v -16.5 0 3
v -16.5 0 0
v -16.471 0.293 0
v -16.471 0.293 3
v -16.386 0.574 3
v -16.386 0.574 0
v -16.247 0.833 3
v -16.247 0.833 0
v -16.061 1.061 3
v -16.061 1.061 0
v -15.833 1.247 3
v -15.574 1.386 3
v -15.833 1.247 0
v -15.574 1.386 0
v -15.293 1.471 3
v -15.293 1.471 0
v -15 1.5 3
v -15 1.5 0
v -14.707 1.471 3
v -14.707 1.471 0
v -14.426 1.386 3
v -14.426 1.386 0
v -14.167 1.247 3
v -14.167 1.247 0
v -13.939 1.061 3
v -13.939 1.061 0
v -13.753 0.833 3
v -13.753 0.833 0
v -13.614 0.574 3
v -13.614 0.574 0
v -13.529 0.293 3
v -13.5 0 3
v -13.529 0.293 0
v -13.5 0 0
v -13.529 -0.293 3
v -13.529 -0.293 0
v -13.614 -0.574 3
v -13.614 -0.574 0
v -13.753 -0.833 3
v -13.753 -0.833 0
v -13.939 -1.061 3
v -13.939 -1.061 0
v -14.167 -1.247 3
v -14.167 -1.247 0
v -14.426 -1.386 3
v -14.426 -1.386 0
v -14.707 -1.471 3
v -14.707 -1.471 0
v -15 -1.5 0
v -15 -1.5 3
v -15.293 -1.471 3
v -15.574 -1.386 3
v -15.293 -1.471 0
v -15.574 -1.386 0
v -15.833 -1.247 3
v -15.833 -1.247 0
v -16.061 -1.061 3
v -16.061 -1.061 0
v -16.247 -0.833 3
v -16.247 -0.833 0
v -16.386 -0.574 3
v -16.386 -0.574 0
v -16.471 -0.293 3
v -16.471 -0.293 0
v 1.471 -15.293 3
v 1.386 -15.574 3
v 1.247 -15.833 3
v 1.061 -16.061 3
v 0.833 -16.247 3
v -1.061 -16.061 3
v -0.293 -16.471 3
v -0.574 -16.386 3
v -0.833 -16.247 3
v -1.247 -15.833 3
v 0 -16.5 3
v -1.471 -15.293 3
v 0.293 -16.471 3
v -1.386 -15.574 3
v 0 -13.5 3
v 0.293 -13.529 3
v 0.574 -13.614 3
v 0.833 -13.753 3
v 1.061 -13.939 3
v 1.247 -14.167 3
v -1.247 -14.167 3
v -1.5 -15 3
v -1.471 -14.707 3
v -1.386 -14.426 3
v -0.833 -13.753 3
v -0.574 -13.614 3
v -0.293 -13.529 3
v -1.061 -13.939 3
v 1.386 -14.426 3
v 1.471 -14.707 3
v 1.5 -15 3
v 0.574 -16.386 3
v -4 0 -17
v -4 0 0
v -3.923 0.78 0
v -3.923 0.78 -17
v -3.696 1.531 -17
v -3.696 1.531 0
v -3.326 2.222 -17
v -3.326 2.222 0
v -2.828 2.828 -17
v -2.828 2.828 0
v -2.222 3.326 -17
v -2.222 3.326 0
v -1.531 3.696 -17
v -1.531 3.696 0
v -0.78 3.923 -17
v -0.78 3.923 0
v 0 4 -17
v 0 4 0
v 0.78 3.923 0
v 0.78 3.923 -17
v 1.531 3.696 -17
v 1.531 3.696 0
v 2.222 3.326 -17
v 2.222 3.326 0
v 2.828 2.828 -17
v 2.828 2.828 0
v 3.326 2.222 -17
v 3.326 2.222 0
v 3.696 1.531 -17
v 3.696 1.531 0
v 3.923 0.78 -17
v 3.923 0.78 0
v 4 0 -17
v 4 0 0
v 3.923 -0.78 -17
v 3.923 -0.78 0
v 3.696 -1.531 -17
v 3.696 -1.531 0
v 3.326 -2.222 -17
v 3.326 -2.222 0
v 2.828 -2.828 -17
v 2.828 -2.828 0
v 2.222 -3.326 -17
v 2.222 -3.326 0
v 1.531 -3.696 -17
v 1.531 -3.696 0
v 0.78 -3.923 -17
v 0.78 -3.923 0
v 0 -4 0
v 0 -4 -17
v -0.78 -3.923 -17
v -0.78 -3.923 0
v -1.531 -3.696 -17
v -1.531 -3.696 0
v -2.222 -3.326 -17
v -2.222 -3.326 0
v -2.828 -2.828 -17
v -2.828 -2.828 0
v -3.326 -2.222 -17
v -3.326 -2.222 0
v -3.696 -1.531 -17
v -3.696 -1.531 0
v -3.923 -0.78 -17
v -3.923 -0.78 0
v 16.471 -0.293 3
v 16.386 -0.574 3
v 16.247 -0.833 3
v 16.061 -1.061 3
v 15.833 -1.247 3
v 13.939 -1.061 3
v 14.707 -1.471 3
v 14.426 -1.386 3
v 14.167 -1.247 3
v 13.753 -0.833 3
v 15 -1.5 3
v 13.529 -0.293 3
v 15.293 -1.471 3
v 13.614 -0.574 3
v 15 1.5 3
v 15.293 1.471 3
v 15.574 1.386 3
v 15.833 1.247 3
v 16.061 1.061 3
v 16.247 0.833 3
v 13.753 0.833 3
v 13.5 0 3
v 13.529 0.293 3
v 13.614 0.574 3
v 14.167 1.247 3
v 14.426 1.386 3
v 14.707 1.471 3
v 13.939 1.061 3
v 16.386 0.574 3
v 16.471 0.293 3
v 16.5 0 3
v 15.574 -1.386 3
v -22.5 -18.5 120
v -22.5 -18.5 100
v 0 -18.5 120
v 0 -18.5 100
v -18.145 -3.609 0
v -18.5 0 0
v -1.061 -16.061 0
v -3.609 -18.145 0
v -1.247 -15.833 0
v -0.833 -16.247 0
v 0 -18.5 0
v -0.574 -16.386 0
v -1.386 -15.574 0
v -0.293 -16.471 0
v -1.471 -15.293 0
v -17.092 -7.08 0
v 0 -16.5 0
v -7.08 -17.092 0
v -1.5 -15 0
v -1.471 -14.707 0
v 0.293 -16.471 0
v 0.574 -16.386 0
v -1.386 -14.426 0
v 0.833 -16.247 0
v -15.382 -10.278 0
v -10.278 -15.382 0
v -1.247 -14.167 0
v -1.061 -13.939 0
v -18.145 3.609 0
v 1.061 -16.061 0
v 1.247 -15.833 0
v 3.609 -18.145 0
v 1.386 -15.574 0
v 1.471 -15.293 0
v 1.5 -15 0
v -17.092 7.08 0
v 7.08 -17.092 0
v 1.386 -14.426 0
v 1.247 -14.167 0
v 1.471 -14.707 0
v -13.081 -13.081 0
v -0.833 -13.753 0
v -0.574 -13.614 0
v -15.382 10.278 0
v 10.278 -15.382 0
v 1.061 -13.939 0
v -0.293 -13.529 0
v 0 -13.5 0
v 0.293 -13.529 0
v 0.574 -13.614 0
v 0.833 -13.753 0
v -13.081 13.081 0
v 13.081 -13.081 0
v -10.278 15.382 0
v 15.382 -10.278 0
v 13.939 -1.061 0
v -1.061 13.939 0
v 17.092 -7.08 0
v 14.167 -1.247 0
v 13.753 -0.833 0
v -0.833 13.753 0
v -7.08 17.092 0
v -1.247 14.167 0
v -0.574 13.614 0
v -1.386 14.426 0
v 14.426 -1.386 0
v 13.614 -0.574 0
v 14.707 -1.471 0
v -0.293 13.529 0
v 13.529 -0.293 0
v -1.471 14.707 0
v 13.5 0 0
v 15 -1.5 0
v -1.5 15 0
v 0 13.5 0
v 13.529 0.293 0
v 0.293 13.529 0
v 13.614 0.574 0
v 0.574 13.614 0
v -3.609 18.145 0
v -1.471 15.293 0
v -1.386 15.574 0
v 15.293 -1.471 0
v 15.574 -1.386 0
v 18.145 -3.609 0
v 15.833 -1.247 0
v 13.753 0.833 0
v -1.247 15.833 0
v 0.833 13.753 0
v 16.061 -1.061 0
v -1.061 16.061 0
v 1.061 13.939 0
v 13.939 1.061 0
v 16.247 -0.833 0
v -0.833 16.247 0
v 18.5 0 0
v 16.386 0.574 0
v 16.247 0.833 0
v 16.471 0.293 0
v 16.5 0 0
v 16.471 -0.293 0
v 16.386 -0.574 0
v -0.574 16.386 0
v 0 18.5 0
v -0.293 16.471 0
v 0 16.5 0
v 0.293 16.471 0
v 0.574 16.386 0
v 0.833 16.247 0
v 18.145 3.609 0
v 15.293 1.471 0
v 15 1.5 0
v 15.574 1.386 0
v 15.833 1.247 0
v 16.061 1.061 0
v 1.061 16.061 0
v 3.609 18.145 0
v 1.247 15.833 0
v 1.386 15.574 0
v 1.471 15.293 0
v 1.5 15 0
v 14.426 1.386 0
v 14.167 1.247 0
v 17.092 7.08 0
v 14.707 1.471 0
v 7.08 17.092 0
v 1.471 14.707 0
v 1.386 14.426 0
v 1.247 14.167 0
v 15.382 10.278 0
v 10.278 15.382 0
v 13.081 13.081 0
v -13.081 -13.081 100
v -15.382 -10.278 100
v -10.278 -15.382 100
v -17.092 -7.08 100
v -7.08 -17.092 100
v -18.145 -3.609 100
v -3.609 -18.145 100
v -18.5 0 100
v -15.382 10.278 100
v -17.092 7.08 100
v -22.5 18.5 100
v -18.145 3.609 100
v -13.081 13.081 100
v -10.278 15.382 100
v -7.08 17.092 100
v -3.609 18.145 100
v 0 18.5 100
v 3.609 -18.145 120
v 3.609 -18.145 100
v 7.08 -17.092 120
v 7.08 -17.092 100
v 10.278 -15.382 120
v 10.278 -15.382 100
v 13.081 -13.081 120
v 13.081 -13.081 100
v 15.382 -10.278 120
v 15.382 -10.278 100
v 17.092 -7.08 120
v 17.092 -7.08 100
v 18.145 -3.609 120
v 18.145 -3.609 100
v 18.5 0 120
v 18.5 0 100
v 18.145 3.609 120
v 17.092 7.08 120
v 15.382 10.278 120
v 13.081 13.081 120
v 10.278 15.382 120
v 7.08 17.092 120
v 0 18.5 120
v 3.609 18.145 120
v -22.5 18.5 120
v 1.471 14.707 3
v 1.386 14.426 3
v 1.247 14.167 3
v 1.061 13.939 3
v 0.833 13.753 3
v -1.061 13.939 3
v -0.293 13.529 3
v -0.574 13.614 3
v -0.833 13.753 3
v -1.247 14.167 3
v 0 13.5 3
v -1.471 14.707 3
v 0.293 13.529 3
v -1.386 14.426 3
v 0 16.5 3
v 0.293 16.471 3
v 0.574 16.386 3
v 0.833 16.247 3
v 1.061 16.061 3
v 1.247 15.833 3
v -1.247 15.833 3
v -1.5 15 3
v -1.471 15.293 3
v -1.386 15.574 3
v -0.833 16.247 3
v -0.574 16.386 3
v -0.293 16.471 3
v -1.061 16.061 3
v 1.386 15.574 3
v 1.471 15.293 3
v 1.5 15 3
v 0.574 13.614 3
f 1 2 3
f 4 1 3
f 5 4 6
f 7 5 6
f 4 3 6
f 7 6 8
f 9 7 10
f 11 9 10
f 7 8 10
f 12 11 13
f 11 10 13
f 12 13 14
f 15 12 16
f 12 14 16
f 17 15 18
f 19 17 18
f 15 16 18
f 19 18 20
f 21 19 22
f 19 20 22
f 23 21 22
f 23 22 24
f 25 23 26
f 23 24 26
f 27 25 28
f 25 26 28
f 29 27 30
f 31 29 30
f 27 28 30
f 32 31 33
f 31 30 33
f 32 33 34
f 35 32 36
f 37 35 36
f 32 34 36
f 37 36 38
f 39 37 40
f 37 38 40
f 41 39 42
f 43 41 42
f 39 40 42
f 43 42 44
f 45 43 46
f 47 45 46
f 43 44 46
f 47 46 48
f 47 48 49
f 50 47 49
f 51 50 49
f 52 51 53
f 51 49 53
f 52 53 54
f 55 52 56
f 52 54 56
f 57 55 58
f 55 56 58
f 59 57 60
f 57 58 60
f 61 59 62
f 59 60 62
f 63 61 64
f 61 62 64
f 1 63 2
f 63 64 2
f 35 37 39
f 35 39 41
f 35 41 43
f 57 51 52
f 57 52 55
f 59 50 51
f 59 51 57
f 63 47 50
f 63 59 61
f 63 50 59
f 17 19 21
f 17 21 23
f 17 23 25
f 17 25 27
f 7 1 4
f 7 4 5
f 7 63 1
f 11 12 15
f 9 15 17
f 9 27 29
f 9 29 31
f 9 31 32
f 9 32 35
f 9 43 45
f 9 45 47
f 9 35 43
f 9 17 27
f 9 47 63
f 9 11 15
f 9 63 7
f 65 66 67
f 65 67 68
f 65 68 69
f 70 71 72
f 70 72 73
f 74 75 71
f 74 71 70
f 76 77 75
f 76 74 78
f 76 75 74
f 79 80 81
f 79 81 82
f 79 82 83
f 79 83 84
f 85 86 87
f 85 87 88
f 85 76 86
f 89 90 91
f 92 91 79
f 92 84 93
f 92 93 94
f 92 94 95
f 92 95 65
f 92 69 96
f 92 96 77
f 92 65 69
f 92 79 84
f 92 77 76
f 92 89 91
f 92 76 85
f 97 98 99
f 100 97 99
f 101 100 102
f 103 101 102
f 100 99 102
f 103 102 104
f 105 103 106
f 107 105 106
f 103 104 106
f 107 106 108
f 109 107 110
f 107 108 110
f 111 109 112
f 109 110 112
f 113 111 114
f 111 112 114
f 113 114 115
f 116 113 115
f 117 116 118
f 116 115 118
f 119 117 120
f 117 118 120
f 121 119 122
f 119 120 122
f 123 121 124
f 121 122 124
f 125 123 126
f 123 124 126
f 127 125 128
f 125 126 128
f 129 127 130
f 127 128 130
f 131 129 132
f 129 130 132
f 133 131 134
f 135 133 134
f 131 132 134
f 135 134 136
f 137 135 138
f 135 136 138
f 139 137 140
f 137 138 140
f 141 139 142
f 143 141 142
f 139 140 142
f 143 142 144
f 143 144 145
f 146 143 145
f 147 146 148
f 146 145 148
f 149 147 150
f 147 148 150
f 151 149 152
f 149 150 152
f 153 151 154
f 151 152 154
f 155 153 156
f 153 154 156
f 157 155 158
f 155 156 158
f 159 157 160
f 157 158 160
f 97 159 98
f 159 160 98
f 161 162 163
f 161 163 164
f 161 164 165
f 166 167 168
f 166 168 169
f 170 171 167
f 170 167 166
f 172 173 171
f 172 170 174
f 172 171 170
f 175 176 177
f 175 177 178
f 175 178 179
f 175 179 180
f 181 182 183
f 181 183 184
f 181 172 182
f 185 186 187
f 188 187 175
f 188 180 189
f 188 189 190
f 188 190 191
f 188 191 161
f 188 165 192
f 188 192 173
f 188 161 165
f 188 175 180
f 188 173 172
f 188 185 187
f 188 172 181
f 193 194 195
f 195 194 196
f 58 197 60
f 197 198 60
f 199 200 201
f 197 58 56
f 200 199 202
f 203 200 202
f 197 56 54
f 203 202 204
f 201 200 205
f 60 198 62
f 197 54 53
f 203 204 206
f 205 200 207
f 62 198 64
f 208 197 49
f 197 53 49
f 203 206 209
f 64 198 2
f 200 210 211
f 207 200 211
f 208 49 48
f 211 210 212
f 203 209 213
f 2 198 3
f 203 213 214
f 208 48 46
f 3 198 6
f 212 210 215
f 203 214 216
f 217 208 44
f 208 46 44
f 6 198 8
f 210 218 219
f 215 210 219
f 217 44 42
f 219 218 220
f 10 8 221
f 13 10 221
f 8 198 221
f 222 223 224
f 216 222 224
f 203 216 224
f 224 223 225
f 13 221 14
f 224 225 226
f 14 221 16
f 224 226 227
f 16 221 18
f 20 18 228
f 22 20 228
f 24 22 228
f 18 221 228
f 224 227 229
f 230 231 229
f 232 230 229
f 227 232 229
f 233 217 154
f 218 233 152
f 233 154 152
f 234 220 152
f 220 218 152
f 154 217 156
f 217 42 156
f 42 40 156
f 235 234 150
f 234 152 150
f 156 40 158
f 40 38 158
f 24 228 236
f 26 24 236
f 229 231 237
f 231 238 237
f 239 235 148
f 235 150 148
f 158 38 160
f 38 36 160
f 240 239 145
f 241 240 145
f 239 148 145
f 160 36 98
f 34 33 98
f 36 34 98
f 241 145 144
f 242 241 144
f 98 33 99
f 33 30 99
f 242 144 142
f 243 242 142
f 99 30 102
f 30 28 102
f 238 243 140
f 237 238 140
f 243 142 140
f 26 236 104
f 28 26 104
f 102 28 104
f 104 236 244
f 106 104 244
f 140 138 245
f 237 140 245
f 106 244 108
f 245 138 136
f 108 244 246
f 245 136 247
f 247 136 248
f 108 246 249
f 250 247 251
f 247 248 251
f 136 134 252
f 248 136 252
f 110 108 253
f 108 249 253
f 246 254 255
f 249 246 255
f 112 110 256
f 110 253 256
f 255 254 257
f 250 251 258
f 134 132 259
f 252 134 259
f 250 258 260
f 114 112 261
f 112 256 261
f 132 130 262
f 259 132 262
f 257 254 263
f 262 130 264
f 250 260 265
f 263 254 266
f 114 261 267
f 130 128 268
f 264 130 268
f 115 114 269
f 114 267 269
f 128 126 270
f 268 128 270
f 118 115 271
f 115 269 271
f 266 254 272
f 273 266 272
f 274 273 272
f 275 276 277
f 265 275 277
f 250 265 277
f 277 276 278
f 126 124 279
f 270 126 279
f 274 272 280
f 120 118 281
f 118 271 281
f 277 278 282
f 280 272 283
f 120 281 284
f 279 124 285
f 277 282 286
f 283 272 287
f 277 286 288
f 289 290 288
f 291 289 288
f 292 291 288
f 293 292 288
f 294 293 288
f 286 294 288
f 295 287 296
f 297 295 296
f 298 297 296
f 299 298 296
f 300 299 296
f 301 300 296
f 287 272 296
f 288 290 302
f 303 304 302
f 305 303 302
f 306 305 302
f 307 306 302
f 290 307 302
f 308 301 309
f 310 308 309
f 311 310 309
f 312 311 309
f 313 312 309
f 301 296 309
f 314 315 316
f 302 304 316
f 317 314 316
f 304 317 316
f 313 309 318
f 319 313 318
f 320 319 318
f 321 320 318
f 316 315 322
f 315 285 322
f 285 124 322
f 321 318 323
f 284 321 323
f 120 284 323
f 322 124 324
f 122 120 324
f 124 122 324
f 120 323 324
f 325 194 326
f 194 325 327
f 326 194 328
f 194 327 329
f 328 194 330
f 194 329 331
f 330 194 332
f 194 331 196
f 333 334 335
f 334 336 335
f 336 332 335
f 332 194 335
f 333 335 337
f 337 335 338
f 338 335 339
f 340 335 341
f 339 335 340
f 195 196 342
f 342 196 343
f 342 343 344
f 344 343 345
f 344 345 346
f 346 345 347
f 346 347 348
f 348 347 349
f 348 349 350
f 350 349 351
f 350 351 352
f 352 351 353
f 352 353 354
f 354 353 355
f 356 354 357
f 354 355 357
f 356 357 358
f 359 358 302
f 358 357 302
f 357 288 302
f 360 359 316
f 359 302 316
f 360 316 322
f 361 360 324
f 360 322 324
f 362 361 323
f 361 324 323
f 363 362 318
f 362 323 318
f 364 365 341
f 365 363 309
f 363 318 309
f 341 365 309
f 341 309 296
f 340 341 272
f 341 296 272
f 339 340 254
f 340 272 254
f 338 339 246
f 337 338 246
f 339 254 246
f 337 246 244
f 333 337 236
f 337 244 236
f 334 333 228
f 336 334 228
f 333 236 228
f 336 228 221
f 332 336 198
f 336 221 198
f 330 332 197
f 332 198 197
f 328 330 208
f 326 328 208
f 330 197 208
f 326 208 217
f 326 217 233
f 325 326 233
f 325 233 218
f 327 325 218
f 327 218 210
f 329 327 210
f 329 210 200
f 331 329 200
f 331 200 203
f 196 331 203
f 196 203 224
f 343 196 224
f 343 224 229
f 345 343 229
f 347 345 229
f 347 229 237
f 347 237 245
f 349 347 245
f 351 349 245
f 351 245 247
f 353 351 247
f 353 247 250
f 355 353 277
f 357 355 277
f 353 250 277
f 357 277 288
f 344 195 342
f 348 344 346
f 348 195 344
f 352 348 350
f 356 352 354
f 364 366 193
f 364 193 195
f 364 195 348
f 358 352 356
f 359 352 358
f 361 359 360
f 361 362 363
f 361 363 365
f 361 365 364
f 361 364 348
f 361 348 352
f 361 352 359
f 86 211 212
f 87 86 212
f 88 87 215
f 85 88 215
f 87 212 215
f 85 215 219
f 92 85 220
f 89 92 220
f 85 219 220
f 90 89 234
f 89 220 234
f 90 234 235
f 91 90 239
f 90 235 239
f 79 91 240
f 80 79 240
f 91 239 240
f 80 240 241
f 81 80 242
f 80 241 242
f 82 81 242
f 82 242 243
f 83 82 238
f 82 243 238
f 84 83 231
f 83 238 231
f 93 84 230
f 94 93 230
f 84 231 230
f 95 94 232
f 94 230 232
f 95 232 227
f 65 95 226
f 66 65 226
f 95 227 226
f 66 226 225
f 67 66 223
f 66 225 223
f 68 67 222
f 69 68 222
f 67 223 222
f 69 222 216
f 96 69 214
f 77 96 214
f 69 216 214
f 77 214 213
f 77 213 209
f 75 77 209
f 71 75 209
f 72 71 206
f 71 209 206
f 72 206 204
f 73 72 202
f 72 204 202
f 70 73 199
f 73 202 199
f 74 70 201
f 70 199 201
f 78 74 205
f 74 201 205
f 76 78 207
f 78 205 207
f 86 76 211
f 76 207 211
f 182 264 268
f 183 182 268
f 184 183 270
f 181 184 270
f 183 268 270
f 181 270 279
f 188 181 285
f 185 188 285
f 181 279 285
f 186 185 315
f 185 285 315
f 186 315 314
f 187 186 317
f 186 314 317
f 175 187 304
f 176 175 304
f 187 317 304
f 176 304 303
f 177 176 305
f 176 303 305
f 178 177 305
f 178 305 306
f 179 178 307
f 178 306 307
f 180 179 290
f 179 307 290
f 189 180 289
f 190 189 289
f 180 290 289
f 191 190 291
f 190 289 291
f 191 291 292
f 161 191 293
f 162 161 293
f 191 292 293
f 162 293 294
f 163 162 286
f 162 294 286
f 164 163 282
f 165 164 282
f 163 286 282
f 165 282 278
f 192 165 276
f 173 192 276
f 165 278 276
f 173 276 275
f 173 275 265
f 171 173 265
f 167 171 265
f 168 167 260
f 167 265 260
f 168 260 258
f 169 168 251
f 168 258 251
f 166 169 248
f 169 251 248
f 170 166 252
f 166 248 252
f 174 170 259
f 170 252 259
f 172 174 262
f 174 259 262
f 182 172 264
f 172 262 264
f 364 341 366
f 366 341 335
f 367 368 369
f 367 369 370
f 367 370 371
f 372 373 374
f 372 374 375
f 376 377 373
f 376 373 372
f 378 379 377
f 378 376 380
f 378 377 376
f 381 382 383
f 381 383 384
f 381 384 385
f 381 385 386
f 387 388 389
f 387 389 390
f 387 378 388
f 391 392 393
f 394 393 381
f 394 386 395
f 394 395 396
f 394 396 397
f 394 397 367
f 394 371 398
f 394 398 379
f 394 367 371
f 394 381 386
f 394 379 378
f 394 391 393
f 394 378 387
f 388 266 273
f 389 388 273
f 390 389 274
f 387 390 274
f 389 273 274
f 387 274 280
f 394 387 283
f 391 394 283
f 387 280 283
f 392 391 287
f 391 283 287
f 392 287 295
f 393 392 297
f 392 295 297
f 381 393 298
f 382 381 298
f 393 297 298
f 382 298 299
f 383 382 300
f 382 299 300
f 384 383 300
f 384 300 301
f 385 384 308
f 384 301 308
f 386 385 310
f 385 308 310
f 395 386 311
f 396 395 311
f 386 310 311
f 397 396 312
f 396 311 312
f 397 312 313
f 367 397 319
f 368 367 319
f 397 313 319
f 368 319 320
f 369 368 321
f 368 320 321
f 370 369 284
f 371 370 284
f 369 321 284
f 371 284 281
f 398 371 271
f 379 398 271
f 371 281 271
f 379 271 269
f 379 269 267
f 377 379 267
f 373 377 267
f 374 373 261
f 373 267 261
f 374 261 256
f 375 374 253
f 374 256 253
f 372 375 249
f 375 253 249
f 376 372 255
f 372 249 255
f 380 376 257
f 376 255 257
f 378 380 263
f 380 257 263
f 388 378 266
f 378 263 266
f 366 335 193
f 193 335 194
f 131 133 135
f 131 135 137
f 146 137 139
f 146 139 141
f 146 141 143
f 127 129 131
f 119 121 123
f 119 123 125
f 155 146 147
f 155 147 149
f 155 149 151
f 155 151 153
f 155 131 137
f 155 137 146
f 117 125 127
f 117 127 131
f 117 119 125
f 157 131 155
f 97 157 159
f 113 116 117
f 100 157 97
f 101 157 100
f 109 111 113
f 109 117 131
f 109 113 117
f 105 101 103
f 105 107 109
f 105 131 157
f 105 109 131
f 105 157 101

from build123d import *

# Parameters (mm, degrees)
SKETCH_1_R          = 18.5
EXTRUDE_1_DEPTH     = 100
EXTRUDE_2_DEPTH     = 20
SKETCH_3_R          = 4
EXTRUDE_3_DEPTH     = 17
SKETCH_4_R          = 1.5
CUT_EXTRUDE_1_DEPTH = 3


with BuildPart() as part:
    # Эскиз1 → Бобышка-Вытянуть1 (new body)
    with BuildSketch(Plane.XY):
        Circle(SKETCH_1_R)
    extrude(amount=EXTRUDE_1_DEPTH)

    # Эскиз2 → Бобышка-Вытянуть2 (add)
    with BuildSketch(Plane.XY.offset(100)):
        with BuildLine():
            Line((0, 18.5), (-22.5, 18.5))
            Line((-22.5, 18.5), (-22.5, -18.5))
            Line((-22.5, -18.5), (0, -18.5))
            ThreePointArc((0, -18.5), (18.5, 0), (0, 18.5))
        make_face()
    extrude(amount=EXTRUDE_2_DEPTH)

    # Эскиз3 → Бобышка-Вытянуть3 (add)
    with BuildSketch(Plane(origin=(0, 0, 0), x_dir=(-1, 0, 0), z_dir=(0, 0, -1))):
        Circle(SKETCH_3_R)
    extrude(amount=EXTRUDE_3_DEPTH)

    # Эскиз4 → Вырез-Вытянуть1 (cut)
    with BuildSketch(Plane(origin=(0, 0, 0), x_dir=(-1, 0, 0), z_dir=(0, 0, -1))):
        with Locations((15, 0)):
            Circle(SKETCH_4_R)
        with Locations((0, 15)):
            Circle(SKETCH_4_R)
        with Locations((-15, 0)):
            Circle(SKETCH_4_R)
        with Locations((0, -15)):
            Circle(SKETCH_4_R)
    extrude(amount=-CUT_EXTRUDE_1_DEPTH, mode=Mode.SUBTRACT)


solid = part.part
